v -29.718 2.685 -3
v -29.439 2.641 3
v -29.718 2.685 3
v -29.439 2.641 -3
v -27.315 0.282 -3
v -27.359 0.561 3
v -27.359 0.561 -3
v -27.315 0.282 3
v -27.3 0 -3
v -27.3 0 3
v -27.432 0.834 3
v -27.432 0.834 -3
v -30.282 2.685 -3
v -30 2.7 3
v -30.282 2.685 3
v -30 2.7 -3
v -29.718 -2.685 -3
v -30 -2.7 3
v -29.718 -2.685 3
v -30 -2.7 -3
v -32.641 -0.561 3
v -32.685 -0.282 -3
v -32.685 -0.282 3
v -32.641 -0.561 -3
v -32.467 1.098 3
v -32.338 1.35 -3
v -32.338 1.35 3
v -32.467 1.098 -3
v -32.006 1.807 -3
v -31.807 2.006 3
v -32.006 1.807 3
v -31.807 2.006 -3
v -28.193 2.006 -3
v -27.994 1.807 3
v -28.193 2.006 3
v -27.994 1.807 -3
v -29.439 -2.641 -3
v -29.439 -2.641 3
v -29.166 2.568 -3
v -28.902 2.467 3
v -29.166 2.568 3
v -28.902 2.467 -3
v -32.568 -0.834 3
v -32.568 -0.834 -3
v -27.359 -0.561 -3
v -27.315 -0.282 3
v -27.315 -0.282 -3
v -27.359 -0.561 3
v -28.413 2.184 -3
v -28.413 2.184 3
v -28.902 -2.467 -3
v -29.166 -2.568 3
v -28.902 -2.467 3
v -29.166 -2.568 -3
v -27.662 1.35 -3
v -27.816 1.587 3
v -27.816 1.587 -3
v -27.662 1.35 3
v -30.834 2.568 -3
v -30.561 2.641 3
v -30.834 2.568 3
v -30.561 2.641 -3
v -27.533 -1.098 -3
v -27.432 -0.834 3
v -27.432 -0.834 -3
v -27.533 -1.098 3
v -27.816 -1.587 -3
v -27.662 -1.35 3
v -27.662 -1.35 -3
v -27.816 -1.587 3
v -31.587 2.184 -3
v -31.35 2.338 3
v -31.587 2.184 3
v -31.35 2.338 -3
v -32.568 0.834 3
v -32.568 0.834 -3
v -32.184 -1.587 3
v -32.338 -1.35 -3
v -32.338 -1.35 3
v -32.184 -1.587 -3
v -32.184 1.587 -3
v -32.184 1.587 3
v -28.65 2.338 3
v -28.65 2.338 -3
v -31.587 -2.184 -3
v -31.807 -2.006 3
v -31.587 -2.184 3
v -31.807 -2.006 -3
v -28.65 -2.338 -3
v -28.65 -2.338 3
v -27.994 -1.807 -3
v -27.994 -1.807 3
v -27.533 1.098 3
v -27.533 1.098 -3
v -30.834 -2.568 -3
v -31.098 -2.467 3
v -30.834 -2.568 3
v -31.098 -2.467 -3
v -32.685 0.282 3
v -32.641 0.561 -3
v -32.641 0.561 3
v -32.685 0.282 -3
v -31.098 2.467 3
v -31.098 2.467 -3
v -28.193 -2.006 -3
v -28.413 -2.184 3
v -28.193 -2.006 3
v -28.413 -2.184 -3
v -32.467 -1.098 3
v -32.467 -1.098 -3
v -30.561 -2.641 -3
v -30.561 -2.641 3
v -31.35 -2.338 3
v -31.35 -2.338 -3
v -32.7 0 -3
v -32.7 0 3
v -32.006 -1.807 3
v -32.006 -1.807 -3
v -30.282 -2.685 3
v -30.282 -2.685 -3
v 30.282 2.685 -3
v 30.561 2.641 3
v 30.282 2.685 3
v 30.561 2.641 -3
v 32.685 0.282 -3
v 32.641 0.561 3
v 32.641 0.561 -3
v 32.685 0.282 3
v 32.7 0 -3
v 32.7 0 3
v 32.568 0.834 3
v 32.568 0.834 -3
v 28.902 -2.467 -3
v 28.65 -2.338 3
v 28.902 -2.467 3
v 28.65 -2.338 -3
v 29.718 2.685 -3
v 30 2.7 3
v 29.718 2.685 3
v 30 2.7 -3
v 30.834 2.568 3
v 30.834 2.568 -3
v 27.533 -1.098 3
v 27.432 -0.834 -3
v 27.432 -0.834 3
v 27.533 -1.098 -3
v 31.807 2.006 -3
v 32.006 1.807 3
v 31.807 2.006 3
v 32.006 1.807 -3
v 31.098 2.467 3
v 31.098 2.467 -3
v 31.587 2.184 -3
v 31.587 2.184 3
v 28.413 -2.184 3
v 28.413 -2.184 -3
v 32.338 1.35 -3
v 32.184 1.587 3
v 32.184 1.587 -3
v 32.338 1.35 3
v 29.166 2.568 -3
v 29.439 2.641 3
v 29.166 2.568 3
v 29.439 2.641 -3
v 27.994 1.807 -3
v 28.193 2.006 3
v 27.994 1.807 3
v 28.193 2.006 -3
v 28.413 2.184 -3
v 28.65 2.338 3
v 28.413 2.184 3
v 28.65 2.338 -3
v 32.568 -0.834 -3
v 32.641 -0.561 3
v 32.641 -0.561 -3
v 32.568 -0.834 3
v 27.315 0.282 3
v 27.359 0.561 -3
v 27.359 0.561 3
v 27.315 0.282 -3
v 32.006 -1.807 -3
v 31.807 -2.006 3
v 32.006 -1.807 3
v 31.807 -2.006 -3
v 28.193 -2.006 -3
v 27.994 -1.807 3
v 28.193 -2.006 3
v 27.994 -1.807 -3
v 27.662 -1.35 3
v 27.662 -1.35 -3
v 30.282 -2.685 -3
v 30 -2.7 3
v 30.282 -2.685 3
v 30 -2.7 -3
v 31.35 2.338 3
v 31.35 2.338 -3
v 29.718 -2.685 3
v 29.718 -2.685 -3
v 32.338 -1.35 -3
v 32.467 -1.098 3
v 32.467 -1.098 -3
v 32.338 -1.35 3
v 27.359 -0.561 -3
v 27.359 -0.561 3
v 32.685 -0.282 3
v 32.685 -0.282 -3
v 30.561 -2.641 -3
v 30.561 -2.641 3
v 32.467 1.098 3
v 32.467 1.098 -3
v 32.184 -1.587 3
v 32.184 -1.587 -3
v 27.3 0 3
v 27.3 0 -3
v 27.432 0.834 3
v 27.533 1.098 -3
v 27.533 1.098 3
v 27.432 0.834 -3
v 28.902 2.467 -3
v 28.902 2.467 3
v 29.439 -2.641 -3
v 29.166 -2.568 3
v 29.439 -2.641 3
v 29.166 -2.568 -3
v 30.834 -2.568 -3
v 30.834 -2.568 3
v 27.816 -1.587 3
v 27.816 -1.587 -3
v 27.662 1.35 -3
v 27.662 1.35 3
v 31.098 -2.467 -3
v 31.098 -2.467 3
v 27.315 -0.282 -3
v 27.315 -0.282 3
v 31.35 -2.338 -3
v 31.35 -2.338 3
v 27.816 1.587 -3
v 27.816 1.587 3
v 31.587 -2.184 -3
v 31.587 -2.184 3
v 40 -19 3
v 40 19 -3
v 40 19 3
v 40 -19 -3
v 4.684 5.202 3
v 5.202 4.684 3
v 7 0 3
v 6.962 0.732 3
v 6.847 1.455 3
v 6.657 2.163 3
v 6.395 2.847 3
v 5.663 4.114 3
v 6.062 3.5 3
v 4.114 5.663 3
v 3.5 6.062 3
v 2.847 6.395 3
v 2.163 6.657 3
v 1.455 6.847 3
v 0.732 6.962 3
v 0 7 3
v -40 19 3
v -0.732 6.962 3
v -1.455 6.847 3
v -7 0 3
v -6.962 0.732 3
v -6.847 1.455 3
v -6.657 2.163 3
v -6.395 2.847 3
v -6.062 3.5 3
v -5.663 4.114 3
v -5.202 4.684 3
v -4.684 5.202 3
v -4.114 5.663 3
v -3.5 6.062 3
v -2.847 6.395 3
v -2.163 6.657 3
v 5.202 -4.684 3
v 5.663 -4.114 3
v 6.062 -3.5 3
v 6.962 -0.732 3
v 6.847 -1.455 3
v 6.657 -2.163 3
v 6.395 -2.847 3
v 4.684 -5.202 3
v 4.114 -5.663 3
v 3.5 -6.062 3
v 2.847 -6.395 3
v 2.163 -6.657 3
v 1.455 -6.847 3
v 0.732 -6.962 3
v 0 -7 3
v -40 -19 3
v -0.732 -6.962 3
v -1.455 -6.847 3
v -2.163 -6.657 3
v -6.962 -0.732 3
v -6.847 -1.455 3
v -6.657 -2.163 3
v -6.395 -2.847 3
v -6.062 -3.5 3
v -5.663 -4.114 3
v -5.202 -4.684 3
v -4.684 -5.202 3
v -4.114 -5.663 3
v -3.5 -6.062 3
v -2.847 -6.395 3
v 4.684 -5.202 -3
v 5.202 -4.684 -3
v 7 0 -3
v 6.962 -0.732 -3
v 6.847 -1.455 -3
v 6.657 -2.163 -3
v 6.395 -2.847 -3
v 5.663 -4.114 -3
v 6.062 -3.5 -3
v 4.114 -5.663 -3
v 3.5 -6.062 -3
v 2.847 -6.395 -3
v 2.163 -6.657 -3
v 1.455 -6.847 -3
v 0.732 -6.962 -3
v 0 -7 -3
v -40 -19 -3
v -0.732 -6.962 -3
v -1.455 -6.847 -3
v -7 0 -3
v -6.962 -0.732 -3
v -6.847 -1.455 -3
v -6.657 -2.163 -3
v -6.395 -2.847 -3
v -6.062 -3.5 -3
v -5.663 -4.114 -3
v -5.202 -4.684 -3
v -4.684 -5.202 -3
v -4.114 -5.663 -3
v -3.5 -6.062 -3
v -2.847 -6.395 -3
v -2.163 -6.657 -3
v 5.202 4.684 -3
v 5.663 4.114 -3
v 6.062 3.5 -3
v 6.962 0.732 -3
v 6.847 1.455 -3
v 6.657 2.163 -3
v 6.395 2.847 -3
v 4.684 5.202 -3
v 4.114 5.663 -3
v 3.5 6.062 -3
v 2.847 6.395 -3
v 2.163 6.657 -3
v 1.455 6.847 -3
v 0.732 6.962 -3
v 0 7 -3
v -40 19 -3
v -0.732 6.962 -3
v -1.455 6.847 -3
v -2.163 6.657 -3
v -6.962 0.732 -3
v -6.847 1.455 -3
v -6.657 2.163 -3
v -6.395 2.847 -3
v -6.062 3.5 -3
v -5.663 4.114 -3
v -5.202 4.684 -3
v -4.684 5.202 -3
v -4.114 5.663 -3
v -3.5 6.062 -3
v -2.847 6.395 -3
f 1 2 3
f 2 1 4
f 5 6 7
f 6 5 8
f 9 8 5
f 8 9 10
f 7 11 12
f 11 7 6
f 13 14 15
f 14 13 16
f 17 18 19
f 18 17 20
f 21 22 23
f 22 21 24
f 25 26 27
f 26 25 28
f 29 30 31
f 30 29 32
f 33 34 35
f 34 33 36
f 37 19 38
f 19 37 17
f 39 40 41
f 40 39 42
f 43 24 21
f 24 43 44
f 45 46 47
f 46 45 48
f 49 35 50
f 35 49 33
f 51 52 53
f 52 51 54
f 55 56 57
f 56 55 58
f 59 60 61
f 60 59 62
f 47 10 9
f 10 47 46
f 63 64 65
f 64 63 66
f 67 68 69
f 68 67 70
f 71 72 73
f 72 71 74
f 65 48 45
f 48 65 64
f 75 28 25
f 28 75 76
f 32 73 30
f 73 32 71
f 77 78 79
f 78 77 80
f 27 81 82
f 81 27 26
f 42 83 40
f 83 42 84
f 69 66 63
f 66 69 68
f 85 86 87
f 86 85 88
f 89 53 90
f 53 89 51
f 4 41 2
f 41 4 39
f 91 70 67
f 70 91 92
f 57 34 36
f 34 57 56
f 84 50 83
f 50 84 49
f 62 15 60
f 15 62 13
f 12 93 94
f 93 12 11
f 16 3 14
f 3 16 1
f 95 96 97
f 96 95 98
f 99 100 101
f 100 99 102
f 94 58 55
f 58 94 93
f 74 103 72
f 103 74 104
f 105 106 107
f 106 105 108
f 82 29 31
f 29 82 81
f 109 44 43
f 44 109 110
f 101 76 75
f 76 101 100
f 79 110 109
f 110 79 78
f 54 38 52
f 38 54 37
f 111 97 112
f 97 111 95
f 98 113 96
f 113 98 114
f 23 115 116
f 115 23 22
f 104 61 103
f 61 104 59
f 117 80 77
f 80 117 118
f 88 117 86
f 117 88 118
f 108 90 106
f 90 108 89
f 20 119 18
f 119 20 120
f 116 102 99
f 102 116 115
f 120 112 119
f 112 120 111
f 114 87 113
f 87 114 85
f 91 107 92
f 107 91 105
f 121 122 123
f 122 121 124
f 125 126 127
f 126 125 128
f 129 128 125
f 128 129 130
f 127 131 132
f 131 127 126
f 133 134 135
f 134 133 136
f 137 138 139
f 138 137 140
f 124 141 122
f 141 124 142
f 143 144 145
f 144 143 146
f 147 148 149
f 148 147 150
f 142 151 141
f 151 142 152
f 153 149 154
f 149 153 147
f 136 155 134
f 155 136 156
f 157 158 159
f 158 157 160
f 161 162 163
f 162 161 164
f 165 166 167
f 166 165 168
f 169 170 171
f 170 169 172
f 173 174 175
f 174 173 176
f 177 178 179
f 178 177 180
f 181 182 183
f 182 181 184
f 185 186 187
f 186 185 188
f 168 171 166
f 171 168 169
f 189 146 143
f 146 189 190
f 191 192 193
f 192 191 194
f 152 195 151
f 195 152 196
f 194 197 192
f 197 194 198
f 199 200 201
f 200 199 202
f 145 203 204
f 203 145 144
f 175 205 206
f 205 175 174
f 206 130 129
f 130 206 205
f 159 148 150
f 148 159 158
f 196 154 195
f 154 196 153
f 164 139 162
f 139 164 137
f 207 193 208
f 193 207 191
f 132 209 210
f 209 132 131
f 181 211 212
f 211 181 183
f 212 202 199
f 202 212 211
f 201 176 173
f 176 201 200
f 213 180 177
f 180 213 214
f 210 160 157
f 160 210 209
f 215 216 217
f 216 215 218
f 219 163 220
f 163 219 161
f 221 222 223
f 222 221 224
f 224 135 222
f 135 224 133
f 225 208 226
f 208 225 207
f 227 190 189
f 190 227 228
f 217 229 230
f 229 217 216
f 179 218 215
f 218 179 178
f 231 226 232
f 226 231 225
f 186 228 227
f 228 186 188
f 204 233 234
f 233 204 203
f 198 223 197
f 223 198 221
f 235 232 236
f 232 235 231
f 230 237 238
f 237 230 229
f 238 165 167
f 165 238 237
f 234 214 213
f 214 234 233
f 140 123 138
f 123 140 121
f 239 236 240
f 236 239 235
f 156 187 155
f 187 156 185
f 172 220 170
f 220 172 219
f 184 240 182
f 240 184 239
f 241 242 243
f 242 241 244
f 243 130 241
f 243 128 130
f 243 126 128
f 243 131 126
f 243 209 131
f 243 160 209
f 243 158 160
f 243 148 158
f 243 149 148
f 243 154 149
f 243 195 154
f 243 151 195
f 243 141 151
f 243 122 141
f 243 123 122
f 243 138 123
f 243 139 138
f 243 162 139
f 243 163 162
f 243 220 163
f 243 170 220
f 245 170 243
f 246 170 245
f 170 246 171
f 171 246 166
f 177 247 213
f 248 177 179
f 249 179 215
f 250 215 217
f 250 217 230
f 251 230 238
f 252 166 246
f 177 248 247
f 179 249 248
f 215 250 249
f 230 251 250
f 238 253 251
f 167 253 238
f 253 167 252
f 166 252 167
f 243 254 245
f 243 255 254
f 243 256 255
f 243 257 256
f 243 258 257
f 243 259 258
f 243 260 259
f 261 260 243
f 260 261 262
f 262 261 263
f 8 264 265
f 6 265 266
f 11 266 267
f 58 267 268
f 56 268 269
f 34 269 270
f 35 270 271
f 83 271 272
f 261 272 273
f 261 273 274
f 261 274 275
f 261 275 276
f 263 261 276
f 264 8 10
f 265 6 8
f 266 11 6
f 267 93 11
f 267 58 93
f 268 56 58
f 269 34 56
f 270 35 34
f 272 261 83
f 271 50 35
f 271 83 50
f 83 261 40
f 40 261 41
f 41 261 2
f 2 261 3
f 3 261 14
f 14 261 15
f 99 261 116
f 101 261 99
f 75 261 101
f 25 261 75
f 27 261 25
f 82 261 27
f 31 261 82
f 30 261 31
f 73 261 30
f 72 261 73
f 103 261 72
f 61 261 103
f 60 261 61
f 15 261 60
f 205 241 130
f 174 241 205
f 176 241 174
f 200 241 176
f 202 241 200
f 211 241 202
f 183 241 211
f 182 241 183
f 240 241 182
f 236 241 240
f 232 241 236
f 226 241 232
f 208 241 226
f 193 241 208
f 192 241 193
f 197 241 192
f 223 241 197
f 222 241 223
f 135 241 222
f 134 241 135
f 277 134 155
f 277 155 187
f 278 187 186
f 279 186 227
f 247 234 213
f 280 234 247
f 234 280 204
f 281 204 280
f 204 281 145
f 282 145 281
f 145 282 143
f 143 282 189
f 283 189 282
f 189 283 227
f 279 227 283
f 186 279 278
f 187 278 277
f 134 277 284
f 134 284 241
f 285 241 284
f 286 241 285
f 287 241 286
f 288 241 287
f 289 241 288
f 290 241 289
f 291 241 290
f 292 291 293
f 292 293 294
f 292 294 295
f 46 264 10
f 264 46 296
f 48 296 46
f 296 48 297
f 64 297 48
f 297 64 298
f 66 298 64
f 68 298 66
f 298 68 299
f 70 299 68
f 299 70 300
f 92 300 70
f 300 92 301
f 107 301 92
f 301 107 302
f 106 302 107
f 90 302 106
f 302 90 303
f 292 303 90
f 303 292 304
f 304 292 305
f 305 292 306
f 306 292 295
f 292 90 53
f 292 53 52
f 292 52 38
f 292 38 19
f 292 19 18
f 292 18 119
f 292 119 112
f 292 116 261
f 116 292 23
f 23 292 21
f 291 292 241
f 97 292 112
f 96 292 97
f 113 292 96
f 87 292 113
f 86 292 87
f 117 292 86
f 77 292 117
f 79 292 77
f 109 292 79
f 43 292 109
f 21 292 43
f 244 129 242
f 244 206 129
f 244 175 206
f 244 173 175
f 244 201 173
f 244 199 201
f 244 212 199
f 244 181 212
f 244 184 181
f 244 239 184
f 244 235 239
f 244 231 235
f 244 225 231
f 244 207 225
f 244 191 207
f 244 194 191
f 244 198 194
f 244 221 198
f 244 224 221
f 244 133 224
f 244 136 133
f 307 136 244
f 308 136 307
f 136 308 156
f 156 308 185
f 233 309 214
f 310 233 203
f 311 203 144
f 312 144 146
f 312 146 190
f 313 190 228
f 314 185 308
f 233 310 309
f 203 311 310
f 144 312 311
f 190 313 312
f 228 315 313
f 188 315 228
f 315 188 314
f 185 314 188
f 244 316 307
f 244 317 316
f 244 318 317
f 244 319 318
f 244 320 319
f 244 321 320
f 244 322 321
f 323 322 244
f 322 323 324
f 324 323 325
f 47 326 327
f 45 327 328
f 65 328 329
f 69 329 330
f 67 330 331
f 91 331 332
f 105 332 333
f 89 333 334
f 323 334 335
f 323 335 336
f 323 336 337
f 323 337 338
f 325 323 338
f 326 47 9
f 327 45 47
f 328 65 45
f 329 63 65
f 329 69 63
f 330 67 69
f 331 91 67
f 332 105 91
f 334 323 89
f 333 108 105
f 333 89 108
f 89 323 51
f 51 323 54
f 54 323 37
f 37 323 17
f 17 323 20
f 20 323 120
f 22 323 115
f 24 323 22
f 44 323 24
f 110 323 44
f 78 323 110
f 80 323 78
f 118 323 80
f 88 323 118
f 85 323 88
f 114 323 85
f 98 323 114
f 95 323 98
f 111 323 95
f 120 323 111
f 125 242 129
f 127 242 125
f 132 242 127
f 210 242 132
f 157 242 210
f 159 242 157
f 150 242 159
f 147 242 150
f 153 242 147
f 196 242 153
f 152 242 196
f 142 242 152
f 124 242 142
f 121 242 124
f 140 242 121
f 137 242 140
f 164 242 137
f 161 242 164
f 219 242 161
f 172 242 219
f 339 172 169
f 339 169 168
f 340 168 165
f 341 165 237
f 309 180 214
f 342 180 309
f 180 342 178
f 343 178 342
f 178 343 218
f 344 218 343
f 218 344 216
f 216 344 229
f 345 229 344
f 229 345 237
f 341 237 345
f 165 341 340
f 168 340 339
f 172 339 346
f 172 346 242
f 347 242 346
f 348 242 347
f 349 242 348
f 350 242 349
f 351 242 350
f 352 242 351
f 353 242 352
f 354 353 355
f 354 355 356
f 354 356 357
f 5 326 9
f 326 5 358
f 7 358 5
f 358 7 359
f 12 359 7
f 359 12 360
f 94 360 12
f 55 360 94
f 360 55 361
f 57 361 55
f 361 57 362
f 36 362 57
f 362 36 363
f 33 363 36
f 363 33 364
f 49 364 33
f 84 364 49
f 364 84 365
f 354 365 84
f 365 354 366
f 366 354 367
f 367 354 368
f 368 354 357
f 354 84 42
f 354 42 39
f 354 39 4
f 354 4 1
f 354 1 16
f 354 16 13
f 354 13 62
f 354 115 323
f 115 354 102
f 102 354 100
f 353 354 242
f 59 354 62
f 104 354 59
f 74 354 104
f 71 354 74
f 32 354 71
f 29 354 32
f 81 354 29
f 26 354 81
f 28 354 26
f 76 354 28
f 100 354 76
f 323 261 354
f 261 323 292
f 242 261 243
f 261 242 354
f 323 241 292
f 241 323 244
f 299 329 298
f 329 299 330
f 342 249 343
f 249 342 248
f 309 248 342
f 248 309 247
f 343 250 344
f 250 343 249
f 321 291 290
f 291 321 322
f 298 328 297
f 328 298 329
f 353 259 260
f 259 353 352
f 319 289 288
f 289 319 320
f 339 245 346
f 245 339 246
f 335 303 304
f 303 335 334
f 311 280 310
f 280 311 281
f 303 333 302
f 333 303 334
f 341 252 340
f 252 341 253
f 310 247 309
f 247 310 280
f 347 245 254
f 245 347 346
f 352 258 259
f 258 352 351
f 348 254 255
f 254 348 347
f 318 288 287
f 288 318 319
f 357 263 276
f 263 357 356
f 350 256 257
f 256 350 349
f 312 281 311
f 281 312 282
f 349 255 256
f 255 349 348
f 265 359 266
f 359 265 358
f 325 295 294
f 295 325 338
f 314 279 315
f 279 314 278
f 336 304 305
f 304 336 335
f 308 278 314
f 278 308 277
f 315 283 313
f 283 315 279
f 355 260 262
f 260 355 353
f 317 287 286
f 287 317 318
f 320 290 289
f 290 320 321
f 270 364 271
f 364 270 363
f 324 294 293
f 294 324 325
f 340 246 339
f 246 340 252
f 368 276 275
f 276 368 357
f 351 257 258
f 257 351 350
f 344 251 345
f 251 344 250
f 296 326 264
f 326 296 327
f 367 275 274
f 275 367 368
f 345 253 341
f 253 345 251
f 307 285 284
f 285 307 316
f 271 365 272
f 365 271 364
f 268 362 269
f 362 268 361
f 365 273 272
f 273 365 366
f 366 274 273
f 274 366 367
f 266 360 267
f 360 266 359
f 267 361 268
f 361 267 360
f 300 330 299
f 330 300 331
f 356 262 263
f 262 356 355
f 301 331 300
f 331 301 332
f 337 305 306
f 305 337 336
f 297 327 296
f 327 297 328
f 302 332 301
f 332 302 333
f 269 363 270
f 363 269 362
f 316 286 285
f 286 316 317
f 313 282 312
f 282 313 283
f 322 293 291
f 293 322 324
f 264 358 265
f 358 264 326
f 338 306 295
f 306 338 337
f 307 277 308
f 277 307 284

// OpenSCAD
// Rod-end mounting plate.
$fn = 60;
eps = 0.02;
plate_l = 80;
plate_w = 38;
plate_t = 6;
bore_d = 14;
difference() {
    cube([plate_l, plate_w, plate_t], center = true);
    translate([0, 0, -plate_t / 2 - eps]) cylinder(d = bore_d, h = plate_t + 2 * eps);
    for (x = [-plate_l / 2 + 10, plate_l / 2 - 10])
        translate([x, 0, -plate_t / 2 - eps]) cylinder(d = 5.4, h = plate_t + 2 * eps);
}
